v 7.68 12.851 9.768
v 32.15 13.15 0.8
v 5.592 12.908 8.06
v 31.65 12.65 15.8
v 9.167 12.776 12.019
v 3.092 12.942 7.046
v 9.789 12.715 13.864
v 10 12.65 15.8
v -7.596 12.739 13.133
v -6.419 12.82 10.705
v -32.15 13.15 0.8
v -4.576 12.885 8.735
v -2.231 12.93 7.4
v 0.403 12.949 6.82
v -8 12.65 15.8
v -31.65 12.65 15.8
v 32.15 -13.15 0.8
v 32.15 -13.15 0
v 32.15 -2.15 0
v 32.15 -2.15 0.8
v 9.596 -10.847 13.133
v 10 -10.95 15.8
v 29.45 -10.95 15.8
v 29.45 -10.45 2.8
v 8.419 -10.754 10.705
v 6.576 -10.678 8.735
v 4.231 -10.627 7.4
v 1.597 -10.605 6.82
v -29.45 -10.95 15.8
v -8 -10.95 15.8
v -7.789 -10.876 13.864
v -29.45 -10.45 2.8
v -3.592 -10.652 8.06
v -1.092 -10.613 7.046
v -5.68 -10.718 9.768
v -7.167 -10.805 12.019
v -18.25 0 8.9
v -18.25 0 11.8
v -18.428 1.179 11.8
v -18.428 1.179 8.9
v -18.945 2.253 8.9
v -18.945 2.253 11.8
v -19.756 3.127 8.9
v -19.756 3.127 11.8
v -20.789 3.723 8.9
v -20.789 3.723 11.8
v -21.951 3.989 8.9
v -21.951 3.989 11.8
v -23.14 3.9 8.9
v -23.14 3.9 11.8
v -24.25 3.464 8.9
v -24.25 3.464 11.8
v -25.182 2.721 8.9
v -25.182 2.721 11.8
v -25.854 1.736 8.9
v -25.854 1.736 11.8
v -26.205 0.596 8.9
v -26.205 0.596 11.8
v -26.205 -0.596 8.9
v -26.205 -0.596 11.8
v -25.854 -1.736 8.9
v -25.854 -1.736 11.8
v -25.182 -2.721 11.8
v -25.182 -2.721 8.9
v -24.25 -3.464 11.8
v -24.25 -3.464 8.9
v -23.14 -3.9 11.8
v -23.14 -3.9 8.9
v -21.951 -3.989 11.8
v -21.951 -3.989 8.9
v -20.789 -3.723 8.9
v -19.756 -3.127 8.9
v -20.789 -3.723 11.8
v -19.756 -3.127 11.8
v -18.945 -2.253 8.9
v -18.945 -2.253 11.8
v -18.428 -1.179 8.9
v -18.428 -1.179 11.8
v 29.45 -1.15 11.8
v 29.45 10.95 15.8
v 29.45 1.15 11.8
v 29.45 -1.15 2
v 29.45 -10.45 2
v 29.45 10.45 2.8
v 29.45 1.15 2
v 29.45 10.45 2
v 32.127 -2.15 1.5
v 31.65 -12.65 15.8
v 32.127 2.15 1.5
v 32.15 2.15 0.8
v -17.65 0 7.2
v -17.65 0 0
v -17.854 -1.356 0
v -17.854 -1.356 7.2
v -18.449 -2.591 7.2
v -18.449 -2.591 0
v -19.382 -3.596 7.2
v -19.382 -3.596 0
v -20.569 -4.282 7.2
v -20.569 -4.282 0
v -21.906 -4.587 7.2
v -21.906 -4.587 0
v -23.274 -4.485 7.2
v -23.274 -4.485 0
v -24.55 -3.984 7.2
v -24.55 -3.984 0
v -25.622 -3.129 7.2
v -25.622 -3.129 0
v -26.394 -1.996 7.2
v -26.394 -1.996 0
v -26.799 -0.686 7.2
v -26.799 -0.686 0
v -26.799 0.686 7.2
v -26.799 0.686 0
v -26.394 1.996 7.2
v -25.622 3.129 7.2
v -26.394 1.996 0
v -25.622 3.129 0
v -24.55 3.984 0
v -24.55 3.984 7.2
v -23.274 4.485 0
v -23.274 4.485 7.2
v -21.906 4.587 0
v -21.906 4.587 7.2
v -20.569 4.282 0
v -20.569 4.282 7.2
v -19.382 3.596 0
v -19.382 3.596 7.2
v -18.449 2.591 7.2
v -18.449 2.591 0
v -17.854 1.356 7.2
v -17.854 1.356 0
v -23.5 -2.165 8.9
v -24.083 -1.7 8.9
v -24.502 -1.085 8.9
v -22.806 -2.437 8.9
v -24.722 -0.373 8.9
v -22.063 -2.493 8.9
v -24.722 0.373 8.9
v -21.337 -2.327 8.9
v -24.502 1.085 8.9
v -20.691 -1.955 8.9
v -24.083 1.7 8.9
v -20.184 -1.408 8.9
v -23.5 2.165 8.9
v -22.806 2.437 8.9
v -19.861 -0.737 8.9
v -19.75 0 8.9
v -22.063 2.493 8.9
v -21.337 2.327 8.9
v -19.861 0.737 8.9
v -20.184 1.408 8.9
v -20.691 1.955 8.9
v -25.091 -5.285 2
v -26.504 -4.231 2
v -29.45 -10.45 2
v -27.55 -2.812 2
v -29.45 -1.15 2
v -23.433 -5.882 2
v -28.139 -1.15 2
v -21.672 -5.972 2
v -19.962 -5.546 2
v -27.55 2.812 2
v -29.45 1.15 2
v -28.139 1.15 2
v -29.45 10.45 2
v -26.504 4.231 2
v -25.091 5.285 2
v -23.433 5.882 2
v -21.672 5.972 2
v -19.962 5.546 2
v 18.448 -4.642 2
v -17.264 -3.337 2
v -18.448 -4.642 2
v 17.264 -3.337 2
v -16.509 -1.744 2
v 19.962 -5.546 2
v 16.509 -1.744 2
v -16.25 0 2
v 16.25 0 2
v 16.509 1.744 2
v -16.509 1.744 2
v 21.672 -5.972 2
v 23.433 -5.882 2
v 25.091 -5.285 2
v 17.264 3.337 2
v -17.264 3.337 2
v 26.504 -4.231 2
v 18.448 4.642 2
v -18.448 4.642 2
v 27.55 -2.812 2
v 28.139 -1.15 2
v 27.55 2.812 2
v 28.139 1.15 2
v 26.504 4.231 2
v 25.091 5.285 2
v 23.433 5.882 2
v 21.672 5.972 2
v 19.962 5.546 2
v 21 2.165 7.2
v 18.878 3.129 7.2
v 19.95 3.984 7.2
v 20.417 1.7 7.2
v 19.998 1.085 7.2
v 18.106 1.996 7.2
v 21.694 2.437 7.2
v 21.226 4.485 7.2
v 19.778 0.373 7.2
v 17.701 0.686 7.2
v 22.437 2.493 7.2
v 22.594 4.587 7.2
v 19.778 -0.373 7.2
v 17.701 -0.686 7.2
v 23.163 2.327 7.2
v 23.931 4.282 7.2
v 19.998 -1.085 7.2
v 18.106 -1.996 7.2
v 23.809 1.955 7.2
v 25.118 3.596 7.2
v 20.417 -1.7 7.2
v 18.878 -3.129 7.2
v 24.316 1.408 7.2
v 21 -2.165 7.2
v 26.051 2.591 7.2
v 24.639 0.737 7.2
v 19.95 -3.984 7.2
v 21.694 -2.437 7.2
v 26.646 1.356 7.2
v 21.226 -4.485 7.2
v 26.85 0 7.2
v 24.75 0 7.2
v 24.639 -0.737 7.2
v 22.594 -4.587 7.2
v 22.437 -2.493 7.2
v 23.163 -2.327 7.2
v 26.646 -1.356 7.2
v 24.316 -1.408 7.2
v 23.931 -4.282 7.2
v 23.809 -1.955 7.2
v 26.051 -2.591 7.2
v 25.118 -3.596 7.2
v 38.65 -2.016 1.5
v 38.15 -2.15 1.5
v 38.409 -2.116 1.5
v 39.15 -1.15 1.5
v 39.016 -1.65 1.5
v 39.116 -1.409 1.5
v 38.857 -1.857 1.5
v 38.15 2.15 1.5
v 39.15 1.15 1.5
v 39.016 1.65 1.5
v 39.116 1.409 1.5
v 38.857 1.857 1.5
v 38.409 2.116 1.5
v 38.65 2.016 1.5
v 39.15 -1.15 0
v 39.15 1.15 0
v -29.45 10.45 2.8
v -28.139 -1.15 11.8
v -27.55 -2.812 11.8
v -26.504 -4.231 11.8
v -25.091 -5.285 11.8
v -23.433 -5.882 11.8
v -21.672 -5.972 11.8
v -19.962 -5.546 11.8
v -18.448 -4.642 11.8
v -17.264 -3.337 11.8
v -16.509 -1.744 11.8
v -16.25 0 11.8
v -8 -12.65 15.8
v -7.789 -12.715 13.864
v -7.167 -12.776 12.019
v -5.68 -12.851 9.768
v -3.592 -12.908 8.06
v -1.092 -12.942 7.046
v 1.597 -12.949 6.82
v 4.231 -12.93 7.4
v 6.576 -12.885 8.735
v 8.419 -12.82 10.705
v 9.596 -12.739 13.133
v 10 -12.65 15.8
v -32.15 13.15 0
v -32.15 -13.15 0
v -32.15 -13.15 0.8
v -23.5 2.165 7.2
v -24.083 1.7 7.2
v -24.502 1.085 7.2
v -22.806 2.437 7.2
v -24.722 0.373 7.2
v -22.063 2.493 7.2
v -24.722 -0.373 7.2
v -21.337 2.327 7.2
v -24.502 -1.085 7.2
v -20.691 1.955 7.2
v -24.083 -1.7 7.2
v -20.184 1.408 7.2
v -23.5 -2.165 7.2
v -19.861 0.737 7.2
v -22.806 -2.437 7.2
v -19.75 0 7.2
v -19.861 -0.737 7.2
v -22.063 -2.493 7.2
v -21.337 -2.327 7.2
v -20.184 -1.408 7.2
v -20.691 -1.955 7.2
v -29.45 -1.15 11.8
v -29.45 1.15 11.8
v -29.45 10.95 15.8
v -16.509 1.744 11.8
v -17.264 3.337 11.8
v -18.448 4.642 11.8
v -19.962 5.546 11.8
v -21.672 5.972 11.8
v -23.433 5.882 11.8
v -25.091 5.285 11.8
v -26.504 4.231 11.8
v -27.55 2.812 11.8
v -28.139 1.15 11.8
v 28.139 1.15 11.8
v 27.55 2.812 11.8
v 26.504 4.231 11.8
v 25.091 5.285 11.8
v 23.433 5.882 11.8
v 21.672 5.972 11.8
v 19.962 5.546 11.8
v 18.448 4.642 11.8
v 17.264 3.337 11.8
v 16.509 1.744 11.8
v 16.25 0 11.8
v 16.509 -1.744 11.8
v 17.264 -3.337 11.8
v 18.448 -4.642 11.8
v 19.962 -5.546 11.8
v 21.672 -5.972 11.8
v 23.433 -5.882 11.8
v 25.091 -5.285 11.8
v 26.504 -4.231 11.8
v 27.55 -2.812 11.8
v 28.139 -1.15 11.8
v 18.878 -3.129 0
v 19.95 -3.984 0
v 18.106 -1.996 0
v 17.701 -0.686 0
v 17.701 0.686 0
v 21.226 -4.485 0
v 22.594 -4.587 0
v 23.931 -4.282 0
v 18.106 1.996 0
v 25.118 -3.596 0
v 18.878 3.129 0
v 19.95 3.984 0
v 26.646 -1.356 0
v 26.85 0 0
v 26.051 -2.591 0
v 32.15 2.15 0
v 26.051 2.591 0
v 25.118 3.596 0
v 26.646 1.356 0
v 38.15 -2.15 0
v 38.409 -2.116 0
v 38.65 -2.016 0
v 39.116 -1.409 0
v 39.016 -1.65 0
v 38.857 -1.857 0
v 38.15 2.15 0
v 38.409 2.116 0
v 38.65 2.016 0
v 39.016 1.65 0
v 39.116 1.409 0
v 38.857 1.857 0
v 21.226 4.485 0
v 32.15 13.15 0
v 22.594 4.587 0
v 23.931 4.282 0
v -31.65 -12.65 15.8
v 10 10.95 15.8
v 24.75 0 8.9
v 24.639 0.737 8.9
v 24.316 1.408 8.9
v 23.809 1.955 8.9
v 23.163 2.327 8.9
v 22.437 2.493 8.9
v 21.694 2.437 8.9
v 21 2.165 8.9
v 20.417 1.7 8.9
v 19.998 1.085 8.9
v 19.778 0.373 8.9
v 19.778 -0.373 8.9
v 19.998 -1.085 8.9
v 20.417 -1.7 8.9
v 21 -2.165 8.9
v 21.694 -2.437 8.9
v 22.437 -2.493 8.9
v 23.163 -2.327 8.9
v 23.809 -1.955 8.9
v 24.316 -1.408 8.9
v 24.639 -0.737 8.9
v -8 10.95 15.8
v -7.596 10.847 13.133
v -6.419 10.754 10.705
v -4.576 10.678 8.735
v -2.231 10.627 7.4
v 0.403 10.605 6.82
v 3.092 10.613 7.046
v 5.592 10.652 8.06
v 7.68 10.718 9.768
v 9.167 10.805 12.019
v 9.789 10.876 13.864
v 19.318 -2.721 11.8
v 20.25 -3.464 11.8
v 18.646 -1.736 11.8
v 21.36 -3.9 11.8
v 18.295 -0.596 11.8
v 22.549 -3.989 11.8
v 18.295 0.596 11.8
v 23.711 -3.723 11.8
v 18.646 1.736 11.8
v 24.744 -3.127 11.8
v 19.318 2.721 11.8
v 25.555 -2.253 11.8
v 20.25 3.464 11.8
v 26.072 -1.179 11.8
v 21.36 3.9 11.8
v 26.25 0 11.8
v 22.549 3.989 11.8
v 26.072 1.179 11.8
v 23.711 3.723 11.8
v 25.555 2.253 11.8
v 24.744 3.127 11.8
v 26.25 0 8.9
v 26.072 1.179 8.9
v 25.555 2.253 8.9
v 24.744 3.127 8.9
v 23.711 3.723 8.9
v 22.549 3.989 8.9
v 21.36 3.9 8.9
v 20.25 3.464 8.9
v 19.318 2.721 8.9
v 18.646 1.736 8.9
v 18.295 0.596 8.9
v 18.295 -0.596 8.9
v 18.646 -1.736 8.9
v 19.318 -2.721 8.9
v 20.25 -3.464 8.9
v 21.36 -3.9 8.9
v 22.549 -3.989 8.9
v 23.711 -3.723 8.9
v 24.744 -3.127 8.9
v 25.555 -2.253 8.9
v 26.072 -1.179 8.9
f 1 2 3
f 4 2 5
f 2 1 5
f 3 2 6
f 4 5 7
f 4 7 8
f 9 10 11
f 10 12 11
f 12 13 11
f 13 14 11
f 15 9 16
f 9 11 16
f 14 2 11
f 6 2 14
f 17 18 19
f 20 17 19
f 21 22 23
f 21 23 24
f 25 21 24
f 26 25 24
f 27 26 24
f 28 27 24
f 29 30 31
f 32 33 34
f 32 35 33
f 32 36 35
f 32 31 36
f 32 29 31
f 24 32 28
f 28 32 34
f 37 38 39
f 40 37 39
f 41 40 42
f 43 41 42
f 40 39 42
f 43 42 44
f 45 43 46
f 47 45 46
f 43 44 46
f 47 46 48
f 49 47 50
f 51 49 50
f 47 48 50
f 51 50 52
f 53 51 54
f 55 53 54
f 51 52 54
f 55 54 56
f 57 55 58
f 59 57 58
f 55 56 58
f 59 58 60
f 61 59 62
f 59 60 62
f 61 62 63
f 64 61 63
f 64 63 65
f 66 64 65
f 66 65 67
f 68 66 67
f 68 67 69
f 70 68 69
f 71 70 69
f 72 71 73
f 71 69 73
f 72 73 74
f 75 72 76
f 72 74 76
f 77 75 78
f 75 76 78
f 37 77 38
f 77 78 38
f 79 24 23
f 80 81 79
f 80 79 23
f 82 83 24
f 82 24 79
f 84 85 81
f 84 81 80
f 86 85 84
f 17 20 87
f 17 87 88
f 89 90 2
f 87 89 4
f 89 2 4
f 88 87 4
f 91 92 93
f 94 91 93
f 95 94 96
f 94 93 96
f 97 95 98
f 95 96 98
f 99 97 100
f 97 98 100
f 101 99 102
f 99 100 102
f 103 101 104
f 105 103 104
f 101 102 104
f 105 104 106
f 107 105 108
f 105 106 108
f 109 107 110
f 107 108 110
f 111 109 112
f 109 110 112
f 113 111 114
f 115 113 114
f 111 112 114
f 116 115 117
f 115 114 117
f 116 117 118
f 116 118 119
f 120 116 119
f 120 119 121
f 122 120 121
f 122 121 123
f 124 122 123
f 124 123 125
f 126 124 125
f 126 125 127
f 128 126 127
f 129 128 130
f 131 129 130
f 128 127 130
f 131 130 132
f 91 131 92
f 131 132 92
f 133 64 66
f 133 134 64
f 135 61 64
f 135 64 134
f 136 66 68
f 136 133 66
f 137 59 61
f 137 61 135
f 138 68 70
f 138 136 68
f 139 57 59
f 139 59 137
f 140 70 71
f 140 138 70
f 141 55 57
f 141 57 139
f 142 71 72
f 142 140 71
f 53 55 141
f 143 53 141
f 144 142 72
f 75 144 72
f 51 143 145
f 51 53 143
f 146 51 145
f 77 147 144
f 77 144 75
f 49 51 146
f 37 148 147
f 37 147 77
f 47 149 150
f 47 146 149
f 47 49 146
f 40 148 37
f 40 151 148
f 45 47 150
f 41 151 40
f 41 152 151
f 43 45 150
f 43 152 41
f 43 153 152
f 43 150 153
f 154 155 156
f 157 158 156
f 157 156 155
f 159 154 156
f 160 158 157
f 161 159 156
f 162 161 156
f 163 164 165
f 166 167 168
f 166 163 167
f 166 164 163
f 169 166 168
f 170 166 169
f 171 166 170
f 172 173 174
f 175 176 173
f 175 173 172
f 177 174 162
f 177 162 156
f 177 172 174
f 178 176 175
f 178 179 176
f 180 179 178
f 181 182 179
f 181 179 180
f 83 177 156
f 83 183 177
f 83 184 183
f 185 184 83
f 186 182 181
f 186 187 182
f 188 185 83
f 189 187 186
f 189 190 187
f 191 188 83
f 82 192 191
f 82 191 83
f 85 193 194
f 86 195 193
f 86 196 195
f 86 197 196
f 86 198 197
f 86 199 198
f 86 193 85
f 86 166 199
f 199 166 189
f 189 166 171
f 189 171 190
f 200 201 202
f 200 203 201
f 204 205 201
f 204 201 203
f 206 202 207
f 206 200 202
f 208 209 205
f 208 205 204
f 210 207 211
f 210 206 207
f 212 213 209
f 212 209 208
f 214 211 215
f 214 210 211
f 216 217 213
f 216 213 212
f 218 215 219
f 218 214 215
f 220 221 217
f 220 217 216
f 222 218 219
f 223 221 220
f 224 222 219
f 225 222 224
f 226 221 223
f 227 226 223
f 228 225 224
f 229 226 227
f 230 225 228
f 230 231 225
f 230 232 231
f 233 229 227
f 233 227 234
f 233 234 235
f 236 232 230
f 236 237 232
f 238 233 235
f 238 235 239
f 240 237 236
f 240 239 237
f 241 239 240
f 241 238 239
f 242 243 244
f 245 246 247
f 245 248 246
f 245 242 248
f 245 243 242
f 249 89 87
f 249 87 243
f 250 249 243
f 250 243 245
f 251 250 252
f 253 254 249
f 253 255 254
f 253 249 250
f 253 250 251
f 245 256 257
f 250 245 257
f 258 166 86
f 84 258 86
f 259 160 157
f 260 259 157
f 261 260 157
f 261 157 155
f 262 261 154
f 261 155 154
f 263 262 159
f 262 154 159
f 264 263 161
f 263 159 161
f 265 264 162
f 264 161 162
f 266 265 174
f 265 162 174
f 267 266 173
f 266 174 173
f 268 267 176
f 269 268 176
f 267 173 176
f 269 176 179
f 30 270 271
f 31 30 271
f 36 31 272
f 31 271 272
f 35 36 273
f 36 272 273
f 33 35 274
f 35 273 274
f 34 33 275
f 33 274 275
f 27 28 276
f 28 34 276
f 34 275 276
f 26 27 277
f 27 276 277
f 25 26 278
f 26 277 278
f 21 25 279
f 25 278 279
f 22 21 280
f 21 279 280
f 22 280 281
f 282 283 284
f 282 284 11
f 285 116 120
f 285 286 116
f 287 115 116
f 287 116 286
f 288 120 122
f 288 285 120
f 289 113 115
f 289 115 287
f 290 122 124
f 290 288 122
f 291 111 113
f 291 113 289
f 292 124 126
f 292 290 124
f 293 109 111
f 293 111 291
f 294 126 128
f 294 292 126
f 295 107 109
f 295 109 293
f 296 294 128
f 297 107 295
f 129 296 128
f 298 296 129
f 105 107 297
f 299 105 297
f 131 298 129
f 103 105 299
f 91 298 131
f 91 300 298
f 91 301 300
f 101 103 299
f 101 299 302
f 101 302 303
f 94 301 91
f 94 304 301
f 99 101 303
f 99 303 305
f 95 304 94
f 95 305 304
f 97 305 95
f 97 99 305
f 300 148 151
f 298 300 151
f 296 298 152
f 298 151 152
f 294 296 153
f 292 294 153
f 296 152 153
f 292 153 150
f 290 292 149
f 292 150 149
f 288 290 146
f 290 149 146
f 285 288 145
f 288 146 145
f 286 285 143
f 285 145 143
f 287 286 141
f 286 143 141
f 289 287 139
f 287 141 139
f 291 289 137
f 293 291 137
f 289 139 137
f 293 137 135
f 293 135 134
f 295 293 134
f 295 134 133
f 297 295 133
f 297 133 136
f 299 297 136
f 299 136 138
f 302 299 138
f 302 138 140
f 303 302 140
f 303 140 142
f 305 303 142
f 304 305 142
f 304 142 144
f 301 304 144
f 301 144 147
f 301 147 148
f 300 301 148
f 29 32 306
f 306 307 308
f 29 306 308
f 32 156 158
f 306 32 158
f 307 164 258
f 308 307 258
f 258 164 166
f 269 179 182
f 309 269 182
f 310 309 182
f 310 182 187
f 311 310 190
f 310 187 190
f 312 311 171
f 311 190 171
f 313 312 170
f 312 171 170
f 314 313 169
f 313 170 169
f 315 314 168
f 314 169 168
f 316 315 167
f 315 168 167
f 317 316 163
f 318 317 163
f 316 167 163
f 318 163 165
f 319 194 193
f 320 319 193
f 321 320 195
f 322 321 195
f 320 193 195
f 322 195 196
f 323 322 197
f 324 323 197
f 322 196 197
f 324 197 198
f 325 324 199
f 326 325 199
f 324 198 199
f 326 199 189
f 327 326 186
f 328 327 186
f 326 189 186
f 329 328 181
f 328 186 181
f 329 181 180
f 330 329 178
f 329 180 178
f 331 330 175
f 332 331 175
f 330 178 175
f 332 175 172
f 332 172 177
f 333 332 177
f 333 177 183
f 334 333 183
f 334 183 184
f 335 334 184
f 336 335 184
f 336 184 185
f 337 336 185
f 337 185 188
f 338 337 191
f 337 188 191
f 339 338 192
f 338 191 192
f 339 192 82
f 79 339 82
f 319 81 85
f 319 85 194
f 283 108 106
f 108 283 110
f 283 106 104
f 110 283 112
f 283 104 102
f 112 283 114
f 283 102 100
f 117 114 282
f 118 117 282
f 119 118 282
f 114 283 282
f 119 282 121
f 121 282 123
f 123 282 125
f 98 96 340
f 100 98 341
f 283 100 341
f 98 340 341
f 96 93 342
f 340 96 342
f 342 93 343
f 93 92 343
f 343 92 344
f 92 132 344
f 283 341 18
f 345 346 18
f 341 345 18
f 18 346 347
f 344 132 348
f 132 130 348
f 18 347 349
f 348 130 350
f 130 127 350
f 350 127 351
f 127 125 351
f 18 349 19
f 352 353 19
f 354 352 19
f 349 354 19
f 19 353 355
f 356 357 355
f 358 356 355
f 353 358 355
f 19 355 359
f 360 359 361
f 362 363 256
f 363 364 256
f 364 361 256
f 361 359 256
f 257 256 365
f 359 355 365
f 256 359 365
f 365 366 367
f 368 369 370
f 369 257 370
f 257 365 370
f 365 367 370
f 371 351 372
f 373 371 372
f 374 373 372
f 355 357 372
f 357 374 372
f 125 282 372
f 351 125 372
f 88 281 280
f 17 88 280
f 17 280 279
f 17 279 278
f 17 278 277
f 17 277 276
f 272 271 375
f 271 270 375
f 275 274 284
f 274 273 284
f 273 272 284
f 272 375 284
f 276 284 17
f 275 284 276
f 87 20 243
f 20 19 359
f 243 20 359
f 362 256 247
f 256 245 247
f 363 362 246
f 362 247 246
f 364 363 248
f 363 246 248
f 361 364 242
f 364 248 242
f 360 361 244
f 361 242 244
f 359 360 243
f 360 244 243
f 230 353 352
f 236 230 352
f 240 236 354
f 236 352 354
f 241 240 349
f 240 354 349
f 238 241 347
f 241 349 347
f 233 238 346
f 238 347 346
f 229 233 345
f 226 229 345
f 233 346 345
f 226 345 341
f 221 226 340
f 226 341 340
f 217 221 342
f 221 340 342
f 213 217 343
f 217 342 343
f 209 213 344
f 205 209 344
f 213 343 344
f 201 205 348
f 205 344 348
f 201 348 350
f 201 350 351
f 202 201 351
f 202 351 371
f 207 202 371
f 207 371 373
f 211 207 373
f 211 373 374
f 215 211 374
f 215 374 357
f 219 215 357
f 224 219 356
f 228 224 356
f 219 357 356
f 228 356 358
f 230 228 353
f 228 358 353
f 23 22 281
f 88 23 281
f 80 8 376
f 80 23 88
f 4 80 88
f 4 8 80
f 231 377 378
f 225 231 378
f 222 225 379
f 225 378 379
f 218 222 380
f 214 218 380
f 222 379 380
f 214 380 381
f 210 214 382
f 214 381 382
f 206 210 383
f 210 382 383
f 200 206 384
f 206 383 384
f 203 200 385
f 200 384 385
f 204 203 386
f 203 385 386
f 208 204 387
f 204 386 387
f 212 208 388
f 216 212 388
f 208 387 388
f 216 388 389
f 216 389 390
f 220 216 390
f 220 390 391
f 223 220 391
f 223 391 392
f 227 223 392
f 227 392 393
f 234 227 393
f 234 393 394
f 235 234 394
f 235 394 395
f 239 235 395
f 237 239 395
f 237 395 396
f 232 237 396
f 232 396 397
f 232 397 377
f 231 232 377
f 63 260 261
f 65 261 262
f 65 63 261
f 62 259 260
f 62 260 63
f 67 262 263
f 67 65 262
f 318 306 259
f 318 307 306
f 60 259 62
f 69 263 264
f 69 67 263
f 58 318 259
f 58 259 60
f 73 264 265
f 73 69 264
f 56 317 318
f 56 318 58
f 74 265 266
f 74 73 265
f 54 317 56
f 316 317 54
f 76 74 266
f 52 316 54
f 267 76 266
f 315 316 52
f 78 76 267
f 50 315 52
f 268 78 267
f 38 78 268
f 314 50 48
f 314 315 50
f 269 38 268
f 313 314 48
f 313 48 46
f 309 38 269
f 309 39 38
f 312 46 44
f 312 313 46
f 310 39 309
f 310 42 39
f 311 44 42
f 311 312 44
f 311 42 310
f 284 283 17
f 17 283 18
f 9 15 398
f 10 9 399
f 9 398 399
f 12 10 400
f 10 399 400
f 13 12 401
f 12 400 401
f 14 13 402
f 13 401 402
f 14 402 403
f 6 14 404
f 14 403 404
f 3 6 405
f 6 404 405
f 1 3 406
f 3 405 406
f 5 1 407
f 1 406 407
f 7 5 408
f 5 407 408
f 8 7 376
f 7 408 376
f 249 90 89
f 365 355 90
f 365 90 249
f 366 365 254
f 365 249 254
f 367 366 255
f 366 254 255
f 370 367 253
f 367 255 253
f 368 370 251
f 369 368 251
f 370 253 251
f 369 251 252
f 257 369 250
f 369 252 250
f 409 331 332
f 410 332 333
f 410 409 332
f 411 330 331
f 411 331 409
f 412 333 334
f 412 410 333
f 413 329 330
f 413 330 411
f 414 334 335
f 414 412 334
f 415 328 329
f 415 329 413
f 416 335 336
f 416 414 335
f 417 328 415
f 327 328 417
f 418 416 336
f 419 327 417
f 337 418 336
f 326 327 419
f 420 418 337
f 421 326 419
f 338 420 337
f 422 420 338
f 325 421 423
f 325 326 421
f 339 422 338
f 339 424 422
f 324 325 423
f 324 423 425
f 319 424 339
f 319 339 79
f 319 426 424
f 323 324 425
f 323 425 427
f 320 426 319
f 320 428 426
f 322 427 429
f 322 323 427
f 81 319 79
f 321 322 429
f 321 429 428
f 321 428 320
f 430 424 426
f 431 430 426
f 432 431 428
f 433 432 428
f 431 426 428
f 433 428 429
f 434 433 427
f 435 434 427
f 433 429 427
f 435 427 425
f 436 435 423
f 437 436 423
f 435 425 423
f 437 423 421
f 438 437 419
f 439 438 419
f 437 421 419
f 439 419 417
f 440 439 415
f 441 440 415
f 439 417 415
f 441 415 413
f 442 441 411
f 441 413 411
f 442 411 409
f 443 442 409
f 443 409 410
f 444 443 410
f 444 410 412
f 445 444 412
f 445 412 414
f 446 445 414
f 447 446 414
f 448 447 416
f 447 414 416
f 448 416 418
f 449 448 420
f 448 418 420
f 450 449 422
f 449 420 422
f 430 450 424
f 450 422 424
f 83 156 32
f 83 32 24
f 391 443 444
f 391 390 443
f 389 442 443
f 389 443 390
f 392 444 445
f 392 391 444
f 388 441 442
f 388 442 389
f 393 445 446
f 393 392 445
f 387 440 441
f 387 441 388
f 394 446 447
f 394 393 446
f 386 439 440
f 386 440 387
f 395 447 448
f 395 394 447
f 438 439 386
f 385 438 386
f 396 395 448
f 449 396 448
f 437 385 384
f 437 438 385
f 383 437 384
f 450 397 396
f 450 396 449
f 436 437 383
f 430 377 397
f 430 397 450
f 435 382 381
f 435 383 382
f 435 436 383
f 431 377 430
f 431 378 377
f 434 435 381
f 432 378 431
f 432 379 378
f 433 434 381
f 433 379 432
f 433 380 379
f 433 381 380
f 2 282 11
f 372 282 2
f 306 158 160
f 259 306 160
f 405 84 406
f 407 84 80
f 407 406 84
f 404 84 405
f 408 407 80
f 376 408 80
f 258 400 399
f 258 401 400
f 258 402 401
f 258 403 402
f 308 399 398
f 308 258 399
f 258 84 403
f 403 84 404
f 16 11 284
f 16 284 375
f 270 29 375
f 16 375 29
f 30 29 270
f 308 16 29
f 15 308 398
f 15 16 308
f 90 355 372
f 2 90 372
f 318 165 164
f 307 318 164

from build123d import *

# Parameters (mm, degrees)
F0_W         = 64.3
F0_H         = 26.3
F1_DEPTH     = 2
F2_W         = 64.3
F2_H         = 26.3
F2_W_2       = 58.9
F2_H_2       = 20.9
F3_DEPTH     = 13.8
F5_DEPTH     = 26.5
F7_DEPTH     = 9.8
F8_R         = 4
F9_DEPTH     = 2.9
F10_R        = 4
F11_DEPTH    = 2.9
F12_R        = 2.5
F13_DEPTH    = 9
F14_R        = 2.5
F15_DEPTH    = 9
F16_R        = 4.6
F17_DEPTH    = 7.2
F18_T1_DEPTH = 102.1483987537
F18_T3_DEPTH = 104.2983987537
F18_T5_DEPTH = 100.1483987537
F19_T1_DEPTH = 53.2490764557
F19_T3_DEPTH = 55.2490764557
F20_W        = 8.1560949282
F20_H        = 4.3
F21_DEPTH    = 1.5
F22_R        = 1


# Not quite as in the source:
# - a fillet or chamfer that OpenCascade refuses, or shapes differently, is made with other operations: its cross-section is extruded or revolved along the edge and cut away or added


with BuildPart() as f1:
    # F0 (on Top) → F1 (new body)
    with BuildSketch(Plane.XY):
        Rectangle(F0_W, F0_H)
    extrude(amount=F1_DEPTH)

    # F2 (on face) → F3 (join)
    with BuildSketch(Plane.XY.offset(2)):
        Rectangle(F2_W, F2_H)
        Rectangle(F2_W_2, F2_H_2, mode=Mode.SUBTRACT)
    extrude(amount=F3_DEPTH)

    # F4 (on face) → F5 (cut)
    with BuildSketch(Plane.XZ.offset(13.15)):
        with BuildLine():
            ThreePointArc((-8, 15.8), (1, 6.8), (10, 15.8))
            Line((10, 15.8), (-8, 15.8))
        make_face()
    extrude(amount=-F5_DEPTH, mode=Mode.SUBTRACT)

    # F6 (on face) → F7 (join)
    with BuildSketch(Plane.XY.offset(2)):
        with BuildLine():
            ThreePointArc((-28.1387604808, -1.15), (-21.6723162131, -5.9721253706), (-16.25, 0))
            ThreePointArc((-16.25, 0), (-21.6723162131, 5.9721253706), (-28.1387604808, 1.15))
            Line((-28.1387604808, 1.15), (-28.1387604808, -1.15))
        make_face()
        with BuildLine():
            Line((-28.1387604808, -1.15), (-28.1387604808, 1.15))
            ThreePointArc((-28.1387604808, 1.15), (-28.25, 0), (-28.1387604808, -1.15))
        make_face()
        with BuildLine():
            ThreePointArc((-28.1387604808, -1.15), (-28.25, 0), (-28.1387604808, 1.15))
            Line((-28.1387604808, 1.15), (-30.8787655085, 1.15))
            Line((-30.8787655085, 1.15), (-30.8787655085, -1.15))
            Line((-30.8787655085, -1.15), (-29.45, -1.15))
            Line((-29.45, -1.15), (-28.1387604808, -1.15))
        make_face()
        with BuildLine():
            ThreePointArc((28.1387604808, -1.15), (28.2221253706, -0.5776837869), (28.25, 0))
            ThreePointArc((28.25, 0), (28.2221253706, 0.5776837869), (28.1387604808, 1.15))
            Line((28.1387604808, 1.15), (28.1387604808, -1.15))
        make_face()
        with BuildLine():
            ThreePointArc((28.1387604808, 1.15), (28.2221253706, 0.5776837869), (28.25, 0))
            ThreePointArc((28.25, 0), (28.2221253706, -0.5776837869), (28.1387604808, -1.15))
            Line((28.1387604808, -1.15), (29.9528725445, -1.15))
            Line((29.9528725445, -1.15), (29.9528725445, 1.15))
            Line((29.9528725445, 1.15), (28.1387604808, 1.15))
        make_face()
        with BuildLine():
            Line((28.1387604808, -1.15), (28.1387604808, 1.15))
            ThreePointArc((28.1387604808, 1.15), (16.25, 0), (28.1387604808, -1.15))
        make_face()
    extrude(amount=F7_DEPTH)

    # F8 (on face) → F9 (cut)
    with BuildSketch(Plane.XY.offset(11.8)):
        with Locations((-22.25, 0)):
            Circle(F8_R)
    extrude(amount=-F9_DEPTH, mode=Mode.SUBTRACT)

    # F10 (on face) → F11 (cut)
    with BuildSketch(Plane.XY.offset(11.8)):
        with Locations((22.25, 0)):
            Circle(F10_R)
    extrude(amount=-F11_DEPTH, mode=Mode.SUBTRACT)

    # F12 (on face) → F13 (cut)
    with BuildSketch(Plane.XY.offset(8.9)):
        with Locations((-22.25, 0)):
            Circle(F12_R)
    extrude(amount=-F13_DEPTH, mode=Mode.SUBTRACT)

    # F14 (on face) → F15 (cut)
    with BuildSketch(Plane.XY.offset(8.9)):
        with Locations((22.25, 0)):
            Circle(F14_R)
    extrude(amount=-F15_DEPTH, mode=Mode.SUBTRACT)

    # F16 (on face) → F17 (cut)
    with BuildSketch(Plane(origin=(0, 0, 0), x_dir=(1, 0, 0), z_dir=(0, 0, -1))):
        with Locations((-22.25, 0)):
            Circle(F16_R)
        with Locations((22.25, 0)):
            Circle(F16_R)
    extrude(amount=-F17_DEPTH, mode=Mode.SUBTRACT)

    # F18: chamfer of 15 x 0.5 on 6 edges, made by hand

    # F18_s2 → F18_t1 (cut)
    with BuildSketch(Plane.YZ.offset(-71.1491993768)):
        Polygon((13.15, 0.8), (12.65, 15.8), (13.15, 15.8), align=None)
        Polygon((-12.65, 15.8), (-13.15, 0.8), (-13.15, 15.8), align=None)
    extrude(amount=F18_T1_DEPTH, mode=Mode.SUBTRACT)

    # F18_s4 → F18_t3 (cut)
    with BuildSketch(Plane.XZ.offset(-52.1491993768)):
        Polygon((32.15, 0.8), (31.65, 15.8), (32.15, 15.8), align=None)
        Polygon((-32.15, 0.8), (-31.65, 15.8), (-32.15, 15.8), align=None)
    extrude(amount=F18_T3_DEPTH, mode=Mode.SUBTRACT)

    # F18_s6 → F18_t5 (cut)
    with BuildSketch(Plane.YZ.offset(-28.9991993768)):
        Polygon((13.15, 0.8), (12.65, 15.8), (13.15, 15.8), align=None)
        Polygon((-12.65, 15.8), (-13.15, 0.8), (-13.15, 15.8), align=None)
    extrude(amount=F18_T5_DEPTH, mode=Mode.SUBTRACT)

    # F19: chamfer of 13 x 0.5 on 4 edges, made by hand

    # F19_s2 → F19_t1 (cut)
    with BuildSketch(Plane.YZ.offset(-23.7990764557)):
        Polygon((-10.95, 15.8), (-10.45, 2.8), (-10.45, 15.8), align=None)
        Polygon((10.45, 2.8), (10.95, 15.8), (10.45, 15.8), align=None)
    extrude(amount=F19_T1_DEPTH, mode=Mode.SUBTRACT)

    # F19_s4 → F19_t3 (cut)
    with BuildSketch(Plane.YZ.offset(-29.45)):
        Polygon((10.45, 2.8), (10.95, 15.8), (10.45, 15.8), align=None)
        Polygon((-10.95, 15.8), (-10.45, 2.8), (-10.45, 15.8), align=None)
    extrude(amount=F19_T3_DEPTH, mode=Mode.SUBTRACT)

    # F20 (on Top) → F21 (join)
    with BuildSketch(Plane.XY):
        with Locations((35.0719525359, 0)):
            Rectangle(F20_W, F20_H)
    extrude(amount=F21_DEPTH)

    # F22
    f22_edges = [f1.edges().sort_by_distance(p)[0] for p in [
        (39.15, 2.15, 0.75),
        (39.15, -2.15, 0.75),
    ]]
    fillet(f22_edges, radius=F22_R)


solid = f1.part
